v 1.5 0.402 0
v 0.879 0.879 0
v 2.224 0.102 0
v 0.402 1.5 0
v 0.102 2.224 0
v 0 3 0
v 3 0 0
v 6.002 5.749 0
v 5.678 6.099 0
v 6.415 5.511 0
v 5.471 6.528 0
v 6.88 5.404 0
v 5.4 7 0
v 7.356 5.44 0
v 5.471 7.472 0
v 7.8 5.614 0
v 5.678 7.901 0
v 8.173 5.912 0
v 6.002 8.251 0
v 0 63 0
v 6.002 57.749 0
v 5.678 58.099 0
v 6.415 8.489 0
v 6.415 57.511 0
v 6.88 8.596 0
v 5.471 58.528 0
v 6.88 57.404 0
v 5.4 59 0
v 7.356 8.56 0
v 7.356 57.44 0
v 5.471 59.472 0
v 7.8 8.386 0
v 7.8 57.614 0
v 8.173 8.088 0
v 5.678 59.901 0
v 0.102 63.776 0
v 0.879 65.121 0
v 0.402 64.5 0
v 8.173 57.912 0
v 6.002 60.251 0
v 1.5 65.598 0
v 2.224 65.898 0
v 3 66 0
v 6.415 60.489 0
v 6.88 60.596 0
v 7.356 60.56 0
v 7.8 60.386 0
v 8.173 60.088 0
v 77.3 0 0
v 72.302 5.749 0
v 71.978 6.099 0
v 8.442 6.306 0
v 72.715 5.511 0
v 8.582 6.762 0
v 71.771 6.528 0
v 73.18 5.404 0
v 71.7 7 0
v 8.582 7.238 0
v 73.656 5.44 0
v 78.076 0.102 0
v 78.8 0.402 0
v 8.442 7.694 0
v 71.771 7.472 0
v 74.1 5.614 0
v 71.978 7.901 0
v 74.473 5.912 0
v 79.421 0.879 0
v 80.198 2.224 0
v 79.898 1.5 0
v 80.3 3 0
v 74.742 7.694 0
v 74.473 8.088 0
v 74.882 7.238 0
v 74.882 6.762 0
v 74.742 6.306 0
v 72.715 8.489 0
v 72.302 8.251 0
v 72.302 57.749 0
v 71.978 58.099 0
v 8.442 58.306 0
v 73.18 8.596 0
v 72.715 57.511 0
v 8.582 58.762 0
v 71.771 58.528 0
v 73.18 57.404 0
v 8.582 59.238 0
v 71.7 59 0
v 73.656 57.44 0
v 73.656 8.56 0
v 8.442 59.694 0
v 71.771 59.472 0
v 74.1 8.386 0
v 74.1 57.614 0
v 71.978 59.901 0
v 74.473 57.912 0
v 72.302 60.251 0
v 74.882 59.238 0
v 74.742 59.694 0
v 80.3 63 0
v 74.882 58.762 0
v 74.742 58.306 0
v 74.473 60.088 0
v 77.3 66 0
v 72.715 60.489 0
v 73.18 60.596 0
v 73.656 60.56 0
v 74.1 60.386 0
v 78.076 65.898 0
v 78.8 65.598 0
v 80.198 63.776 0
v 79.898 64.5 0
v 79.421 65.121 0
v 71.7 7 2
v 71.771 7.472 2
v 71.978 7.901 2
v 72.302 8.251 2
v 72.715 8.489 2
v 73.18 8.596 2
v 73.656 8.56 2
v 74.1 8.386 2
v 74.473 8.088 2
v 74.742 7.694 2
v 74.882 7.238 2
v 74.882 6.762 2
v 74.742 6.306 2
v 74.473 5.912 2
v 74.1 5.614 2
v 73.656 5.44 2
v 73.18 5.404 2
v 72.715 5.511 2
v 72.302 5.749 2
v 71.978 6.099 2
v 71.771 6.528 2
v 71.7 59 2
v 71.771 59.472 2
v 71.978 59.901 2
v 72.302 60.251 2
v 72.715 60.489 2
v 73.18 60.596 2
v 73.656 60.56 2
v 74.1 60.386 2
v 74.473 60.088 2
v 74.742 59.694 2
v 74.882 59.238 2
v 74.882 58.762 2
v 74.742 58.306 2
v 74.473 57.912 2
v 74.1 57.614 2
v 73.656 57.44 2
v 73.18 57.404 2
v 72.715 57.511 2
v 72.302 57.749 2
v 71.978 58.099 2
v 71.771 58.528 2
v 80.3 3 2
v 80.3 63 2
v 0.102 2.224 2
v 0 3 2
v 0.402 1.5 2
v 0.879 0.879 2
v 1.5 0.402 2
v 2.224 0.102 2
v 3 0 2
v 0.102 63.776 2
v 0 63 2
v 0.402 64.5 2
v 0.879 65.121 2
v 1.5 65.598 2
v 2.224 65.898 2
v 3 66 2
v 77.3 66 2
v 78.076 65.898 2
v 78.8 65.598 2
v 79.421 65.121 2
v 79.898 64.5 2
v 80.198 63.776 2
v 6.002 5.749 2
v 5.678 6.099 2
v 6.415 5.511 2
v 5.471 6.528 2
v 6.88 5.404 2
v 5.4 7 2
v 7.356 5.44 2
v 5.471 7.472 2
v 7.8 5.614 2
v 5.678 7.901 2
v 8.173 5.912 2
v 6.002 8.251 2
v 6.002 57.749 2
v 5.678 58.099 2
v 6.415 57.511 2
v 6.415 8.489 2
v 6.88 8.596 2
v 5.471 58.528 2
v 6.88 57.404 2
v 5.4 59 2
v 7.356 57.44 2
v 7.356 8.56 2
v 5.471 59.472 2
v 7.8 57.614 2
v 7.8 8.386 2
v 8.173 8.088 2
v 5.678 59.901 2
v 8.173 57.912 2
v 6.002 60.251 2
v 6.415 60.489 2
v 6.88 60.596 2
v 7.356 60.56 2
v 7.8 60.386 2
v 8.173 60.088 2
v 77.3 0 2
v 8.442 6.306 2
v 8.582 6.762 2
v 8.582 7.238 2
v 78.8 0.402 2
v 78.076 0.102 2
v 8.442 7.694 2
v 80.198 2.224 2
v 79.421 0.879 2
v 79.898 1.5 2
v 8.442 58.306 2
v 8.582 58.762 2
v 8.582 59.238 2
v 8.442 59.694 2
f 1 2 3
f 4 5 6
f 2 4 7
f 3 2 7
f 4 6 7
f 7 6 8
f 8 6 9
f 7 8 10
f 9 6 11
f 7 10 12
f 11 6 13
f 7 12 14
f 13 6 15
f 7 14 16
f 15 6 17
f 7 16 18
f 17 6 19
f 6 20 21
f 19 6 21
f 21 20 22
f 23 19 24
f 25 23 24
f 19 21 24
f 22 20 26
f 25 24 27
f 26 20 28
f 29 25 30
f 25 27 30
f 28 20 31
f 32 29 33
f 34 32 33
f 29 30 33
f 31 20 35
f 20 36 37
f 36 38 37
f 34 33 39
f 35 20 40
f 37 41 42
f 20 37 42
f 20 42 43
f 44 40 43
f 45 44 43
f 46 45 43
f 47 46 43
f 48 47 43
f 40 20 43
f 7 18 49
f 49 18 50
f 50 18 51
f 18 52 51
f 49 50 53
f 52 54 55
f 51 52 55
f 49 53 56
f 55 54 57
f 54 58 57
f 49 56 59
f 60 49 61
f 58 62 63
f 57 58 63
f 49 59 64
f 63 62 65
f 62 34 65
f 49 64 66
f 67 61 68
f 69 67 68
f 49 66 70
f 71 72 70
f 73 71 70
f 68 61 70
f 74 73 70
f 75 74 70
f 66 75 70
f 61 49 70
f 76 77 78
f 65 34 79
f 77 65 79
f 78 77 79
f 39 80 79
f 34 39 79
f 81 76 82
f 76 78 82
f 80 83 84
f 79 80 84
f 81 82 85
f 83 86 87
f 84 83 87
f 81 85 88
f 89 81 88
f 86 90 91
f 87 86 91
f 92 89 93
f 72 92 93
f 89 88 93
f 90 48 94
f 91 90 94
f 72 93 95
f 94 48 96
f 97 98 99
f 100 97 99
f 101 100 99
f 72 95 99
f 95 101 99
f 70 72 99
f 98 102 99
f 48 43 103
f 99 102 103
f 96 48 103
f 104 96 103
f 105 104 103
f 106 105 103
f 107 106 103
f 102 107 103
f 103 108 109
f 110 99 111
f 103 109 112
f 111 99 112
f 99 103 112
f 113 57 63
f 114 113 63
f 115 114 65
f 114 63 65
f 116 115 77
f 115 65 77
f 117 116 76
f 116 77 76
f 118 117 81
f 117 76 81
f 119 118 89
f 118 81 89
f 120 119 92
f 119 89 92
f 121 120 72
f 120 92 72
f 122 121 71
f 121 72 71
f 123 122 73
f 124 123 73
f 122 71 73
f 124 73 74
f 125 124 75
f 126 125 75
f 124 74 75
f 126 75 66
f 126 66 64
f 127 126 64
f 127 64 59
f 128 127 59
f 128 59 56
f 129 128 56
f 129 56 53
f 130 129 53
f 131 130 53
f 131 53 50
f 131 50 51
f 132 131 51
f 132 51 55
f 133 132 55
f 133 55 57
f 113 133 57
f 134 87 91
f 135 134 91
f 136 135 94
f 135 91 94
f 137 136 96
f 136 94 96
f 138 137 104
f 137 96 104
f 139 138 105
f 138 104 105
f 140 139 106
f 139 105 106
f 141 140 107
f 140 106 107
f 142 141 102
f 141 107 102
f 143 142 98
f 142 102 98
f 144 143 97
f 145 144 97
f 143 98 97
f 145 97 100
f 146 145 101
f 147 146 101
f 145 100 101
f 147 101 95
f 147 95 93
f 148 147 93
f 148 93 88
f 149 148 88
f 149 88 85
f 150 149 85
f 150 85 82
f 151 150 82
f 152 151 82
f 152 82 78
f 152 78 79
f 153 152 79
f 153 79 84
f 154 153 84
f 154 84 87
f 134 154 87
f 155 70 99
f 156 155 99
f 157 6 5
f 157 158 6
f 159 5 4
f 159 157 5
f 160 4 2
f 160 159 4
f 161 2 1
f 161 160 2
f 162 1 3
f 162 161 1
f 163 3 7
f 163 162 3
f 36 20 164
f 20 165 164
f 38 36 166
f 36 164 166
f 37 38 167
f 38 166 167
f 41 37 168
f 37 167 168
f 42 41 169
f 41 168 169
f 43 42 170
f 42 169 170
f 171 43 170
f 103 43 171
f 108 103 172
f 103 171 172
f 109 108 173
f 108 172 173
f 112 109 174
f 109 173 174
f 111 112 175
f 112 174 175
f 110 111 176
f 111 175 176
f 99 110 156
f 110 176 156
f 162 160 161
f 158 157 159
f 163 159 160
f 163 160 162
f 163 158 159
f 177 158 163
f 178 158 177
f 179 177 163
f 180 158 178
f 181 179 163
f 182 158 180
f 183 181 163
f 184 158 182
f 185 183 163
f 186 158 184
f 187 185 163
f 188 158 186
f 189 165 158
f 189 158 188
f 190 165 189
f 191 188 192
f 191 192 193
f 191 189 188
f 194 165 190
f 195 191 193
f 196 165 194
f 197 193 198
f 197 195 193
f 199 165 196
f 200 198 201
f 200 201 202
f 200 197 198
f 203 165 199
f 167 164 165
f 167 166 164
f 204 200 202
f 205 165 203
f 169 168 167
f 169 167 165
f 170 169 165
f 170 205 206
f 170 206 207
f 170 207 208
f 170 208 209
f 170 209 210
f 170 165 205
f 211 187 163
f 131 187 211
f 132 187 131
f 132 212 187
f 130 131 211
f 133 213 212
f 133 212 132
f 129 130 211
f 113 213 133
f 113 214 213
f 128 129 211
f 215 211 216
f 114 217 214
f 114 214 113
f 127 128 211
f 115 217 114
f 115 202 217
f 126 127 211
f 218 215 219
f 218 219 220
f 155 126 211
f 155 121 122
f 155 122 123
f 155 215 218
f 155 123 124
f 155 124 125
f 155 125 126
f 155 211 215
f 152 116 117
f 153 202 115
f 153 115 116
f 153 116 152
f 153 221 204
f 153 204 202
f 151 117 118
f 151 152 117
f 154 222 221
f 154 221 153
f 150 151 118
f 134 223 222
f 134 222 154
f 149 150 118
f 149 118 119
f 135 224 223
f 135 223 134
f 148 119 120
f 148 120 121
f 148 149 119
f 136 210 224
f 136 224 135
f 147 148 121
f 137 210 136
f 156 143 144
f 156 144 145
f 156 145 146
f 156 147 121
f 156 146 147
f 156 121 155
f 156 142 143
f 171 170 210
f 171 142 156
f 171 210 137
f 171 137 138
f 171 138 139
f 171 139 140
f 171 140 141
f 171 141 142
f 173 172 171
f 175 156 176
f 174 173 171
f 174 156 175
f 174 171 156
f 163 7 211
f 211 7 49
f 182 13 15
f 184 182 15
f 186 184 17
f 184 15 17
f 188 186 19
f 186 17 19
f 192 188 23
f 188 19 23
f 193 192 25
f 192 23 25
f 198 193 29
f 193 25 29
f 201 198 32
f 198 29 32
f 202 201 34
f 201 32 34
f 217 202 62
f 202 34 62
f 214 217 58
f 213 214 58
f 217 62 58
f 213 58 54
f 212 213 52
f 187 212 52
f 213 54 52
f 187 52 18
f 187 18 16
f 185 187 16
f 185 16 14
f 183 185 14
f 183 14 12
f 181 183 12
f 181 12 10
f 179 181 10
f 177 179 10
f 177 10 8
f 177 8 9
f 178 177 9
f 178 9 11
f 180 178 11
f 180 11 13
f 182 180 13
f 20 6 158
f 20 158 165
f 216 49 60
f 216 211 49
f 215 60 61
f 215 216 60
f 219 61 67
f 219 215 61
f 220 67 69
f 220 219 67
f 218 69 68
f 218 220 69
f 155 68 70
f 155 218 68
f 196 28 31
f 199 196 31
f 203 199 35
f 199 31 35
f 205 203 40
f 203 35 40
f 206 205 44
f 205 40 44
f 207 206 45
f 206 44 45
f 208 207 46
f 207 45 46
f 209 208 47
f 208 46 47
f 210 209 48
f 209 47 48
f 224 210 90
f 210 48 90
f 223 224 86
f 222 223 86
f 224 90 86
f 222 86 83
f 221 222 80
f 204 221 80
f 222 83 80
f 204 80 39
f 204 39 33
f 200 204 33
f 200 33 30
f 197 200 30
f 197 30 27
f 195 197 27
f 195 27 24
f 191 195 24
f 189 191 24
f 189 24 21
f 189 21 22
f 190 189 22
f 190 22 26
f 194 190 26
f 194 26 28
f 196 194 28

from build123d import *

# Parameters (mm, degrees)
SKETCH1_W                  = 80.3
SKETCH1_H                  = 66
BOSS_EXTRUDE1_DEPTH        = 2
F_3_2_3_2_DIAMETER_HOLE1_D = 3.2
FILLET1_R                  = 3


with BuildPart() as part:
    # Sketch1 → Boss-Extrude1 (new body)
    with BuildSketch(Plane.XY):
        with Locations((40.15, 33)):
            Rectangle(SKETCH1_W, SKETCH1_H)
    extrude(amount=BOSS_EXTRUDE1_DEPTH)

    # Ø3.2 (3.2) Diameter Hole1 (through all)
    with Locations(Plane.XY.offset(2)):
        with Locations((7, 59), (73.3, 59), (73.3, 7), (7, 7)):
            Hole(F_3_2_3_2_DIAMETER_HOLE1_D / 2)

    # Fillet1
    fillet1_edges = [part.edges().sort_by_distance(p)[0] for p in [
        (0, 66, 1),
        (80.3, 66, 1),
        (80.3, 0, 1),
        (0, 0, 1),
    ]]
    fillet(fillet1_edges, radius=FILLET1_R)


solid = part.part
